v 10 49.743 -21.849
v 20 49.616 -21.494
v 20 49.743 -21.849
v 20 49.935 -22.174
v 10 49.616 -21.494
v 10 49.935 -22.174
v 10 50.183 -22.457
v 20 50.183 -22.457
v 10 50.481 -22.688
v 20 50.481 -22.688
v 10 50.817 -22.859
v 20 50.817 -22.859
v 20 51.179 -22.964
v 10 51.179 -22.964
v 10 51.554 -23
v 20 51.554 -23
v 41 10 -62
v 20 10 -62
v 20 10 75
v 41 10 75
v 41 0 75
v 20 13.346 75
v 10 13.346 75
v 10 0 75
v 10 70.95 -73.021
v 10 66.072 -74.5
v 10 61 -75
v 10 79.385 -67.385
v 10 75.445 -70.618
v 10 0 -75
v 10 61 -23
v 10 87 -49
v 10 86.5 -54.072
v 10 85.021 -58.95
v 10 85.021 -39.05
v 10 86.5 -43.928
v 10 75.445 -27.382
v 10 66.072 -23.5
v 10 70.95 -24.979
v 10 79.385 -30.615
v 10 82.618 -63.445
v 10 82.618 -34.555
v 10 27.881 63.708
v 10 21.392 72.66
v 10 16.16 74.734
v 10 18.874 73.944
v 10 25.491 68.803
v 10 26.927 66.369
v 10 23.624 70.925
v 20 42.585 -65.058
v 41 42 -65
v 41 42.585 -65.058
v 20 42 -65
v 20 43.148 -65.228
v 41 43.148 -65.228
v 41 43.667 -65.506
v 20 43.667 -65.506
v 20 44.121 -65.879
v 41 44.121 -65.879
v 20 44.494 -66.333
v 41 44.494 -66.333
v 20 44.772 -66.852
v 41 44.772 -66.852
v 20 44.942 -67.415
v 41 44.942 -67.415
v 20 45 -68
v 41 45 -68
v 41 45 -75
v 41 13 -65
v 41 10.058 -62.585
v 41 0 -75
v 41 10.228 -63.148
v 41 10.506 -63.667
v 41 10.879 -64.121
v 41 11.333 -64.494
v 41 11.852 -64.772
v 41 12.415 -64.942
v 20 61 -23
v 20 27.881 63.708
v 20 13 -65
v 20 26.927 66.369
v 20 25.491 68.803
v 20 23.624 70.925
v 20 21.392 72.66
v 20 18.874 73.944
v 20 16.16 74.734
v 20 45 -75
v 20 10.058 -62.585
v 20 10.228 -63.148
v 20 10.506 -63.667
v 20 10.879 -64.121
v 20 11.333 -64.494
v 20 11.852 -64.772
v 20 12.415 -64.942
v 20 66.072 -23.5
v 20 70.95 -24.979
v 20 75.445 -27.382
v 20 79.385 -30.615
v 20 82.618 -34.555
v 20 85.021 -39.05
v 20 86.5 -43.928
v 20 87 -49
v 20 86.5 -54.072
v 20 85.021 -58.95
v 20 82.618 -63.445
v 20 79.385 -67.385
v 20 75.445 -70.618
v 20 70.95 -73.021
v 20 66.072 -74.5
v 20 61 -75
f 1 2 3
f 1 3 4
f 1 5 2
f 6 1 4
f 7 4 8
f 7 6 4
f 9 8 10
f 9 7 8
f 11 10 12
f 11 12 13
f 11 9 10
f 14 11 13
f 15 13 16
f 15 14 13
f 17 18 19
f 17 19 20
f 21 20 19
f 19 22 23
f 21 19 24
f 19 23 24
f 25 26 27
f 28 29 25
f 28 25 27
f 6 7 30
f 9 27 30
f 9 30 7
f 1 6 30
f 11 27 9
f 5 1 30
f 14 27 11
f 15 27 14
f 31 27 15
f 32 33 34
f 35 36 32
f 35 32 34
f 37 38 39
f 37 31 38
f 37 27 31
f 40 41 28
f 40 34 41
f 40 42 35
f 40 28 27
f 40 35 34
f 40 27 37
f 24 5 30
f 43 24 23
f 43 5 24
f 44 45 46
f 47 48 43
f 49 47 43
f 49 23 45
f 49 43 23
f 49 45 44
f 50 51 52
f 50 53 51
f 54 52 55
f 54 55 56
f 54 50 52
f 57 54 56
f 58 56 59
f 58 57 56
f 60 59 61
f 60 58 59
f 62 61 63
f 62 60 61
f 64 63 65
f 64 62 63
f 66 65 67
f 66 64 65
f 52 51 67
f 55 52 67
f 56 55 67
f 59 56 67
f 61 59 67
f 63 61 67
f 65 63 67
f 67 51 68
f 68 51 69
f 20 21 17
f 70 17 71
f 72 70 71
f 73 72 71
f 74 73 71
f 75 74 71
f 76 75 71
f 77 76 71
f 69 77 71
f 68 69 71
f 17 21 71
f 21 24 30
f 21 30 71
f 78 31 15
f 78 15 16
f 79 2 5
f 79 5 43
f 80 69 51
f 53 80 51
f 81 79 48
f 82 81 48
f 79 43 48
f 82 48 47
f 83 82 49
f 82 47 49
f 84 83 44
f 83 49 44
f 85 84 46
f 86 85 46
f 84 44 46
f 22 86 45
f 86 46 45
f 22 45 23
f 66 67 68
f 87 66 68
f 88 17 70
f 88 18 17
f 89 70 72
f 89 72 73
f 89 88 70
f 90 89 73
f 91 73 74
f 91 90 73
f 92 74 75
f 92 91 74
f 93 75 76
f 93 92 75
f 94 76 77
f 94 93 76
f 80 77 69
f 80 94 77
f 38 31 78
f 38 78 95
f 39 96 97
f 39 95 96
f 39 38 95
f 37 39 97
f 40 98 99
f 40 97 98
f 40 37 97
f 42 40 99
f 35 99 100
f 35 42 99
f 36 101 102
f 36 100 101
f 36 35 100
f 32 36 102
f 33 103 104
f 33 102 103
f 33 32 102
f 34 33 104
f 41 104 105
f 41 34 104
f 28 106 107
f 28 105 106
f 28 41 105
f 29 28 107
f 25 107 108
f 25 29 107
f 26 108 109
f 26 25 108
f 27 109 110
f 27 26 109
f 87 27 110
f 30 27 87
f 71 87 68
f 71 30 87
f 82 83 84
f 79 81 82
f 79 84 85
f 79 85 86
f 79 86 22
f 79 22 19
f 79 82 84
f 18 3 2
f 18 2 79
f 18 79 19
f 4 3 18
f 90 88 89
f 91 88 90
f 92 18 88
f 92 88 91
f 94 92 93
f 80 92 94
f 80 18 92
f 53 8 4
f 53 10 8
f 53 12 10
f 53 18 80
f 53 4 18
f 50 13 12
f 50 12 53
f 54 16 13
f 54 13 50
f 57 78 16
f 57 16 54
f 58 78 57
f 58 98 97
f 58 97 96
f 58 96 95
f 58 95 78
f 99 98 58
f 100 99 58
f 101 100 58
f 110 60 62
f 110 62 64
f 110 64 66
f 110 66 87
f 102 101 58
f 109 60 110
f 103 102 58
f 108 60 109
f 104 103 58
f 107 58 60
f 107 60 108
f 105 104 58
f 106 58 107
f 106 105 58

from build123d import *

# Parameters (mm, degrees)
SKETCH1_W                = 82
SKETCH1_H                = 150
BOSS_EXTRUDE1_DEPTH      = 10
SKETCH2_W                = 10
SKETCH2_H                = 45
BOSS_EXTRUDE2_DEPTH      = 82
BOSS_EXTRUDE3_DEPTH      = 42
BOSS_EXTRUDE3_DEPTH_BACK = 10
FILLET3_RADIUS           = 26
FILLET3_LENGTH           = 10
FILLET4_RADIUS           = 26
FILLET4_LENGTH           = 10
BOSS_EXTRUDE4_DEPTH      = 10
BOSS_EXTRUDE5_DEPTH      = 10
FILLET5_R                = 15
FILLET6_R                = 15
SKETCH6_R                = 8
SKETCH6_R_2              = 5.5
CUT_EXTRUDE1_DEPTH       = 131.057679512
FILLET7_R                = 3
FILLET8_R                = 3
FILLET9_R                = 3
FILLET10_R               = 3
FILLET11_R               = 2
SKETCH7_R                = 5.5
CUT_EXTRUDE2_DEPTH       = 116.043470045
SKETCH8_W                = 181.068808942
SKETCH8_H                = 99.289789265
CUT_EXTRUDE3_DEPTH       = 126.678160394
SKETCH9_W                = 17.116284166
SKETCH9_H                = 92.331504729
BOSS_EXTRUDE6_DEPTH      = 10
SKETCH10_W               = 23.658167423
SKETCH10_H               = 25.148445686
SKETCH10_W_2             = 13.971358715
SKETCH10_H_2             = 14.716497846
BOSS_EXTRUDE7_DEPTH      = 10


with BuildPart() as part:
    # Sketch1 → Boss-Extrude1 (new body)
    with BuildSketch(Plane(origin=(0, 0, 0), x_dir=(1, 0, 0), z_dir=(0, 1, 0))):
        Rectangle(SKETCH1_W, SKETCH1_H)
    extrude(amount=BOSS_EXTRUDE1_DEPTH)

    # Sketch2 → Boss-Extrude2 (add, through all)
    with BuildSketch(Plane(origin=(41, 0, 0), x_dir=(0, 0, -1), z_dir=(1, 0, 0))):
        with Locations((70, 22.5)):
            Rectangle(SKETCH2_W, SKETCH2_H)
    extrude(amount=-BOSS_EXTRUDE2_DEPTH)

    # Sketch3 → Boss-Extrude3 (add, two sides: drawn at the far end of the back side and taken through both)
    with BuildSketch(Plane.XY.offset(-65).offset(-BOSS_EXTRUDE3_DEPTH_BACK)):
        Polygon((10, 45), (10, 10), (20, 10), (20, 45), (20, 87), (10, 87), align=None)
        Polygon((-10, 45), (-10, 87), (-20, 87), (-20, 45), (-20, 10), (-10, 10), align=None)
    extrude(amount=BOSS_EXTRUDE3_DEPTH + BOSS_EXTRUDE3_DEPTH_BACK)

    # Fillet3: full round fillet: the end face becomes a half cylinder, R = half its width
    fillet3_face = Plane((15, 87, -49), x_dir=(-1, 0, 0), z_dir=(0, 1, 0))  # on the end face: x along it, z out of the body
    fillet3_slab = fillet3_face.offset(-FILLET3_RADIUS / 2) * Box(FILLET3_LENGTH, 2 * FILLET3_RADIUS, FILLET3_RADIUS, mode=Mode.PRIVATE)  # the body's end, R deep
    fillet3_round = Plane((15, 61, -49), x_dir=(0, 1, 0), z_dir=(-1, 0, 0)) * Cylinder(FILLET3_RADIUS, FILLET3_LENGTH, mode=Mode.PRIVATE)  # its axis R under the face
    add(fillet3_slab - fillet3_round, mode=Mode.SUBTRACT)

    # Fillet4: full round fillet: the end face becomes a half cylinder, R = half its width
    fillet4_face = Plane((-15, 87, -49), x_dir=(-1, 0, 0), z_dir=(0, 1, 0))  # on the end face: x along it, z out of the body
    fillet4_slab = fillet4_face.offset(-FILLET4_RADIUS / 2) * Box(FILLET4_LENGTH, 2 * FILLET4_RADIUS, FILLET4_RADIUS, mode=Mode.PRIVATE)  # the body's end, R deep
    fillet4_round = Plane((-15, 61, -49), x_dir=(0, 1, 0), z_dir=(-1, 0, 0)) * Cylinder(FILLET4_RADIUS, FILLET4_LENGTH, mode=Mode.PRIVATE)  # its axis R under the face
    add(fillet4_slab - fillet4_round, mode=Mode.SUBTRACT)

    # Sketch4 → Boss-Extrude4 (add)
    with BuildSketch(Plane(origin=(20, 0, 0), x_dir=(0, 0, -1), z_dir=(1, 0, 0))):
        Polygon((23, 10), (23, 50), (-75, 25), (-75, 10), align=None)
    extrude(amount=-BOSS_EXTRUDE4_DEPTH)

    # Sketch5 → Boss-Extrude5 (add)
    with BuildSketch(Plane.ZY.offset(20)):
        Polygon((-23, 50), (75, 25), (75, 10), (-23, 10), align=None)
    extrude(amount=-BOSS_EXTRUDE5_DEPTH)

    # Fillet5
    fillet5_edges = [part.edges().sort_by_distance(p)[0] for p in [
        (15, 25, 75),
    ]]
    fillet(fillet5_edges, radius=FILLET5_R)

    # Fillet6
    fillet6_edges = [part.edges().sort_by_distance(p)[0] for p in [
        (-15, 25, 75),
    ]]
    fillet(fillet6_edges, radius=FILLET6_R)

    # Sketch6 → Cut-Extrude1 (cut, through all)
    with BuildSketch(Plane(origin=(20, 0, 0), x_dir=(0, 0, -1), z_dir=(1, 0, 0))):
        with Locations((49, 61)):
            Circle(SKETCH6_R)
        with Locations((-60, 17.5)):
            Circle(SKETCH6_R_2)
    extrude(amount=-CUT_EXTRUDE1_DEPTH, mode=Mode.SUBTRACT)

    # Fillet7
    fillet7_edges = [part.edges().sort_by_distance(p)[0] for p in [
        (30.5, 45, -65),
    ]]
    fillet(fillet7_edges, radius=FILLET7_R)

    # Fillet8
    fillet8_edges = [part.edges().sort_by_distance(p)[0] for p in [
        (0, 45, -65),
    ]]
    fillet(fillet8_edges, radius=FILLET8_R)

    # Fillet9
    fillet9_edges = [part.edges().sort_by_distance(p)[0] for p in [
        (-30.5, 45, -65),
    ]]
    fillet(fillet9_edges, radius=FILLET9_R)

    # Fillet10
    fillet10_edges = [part.edges().sort_by_distance(p)[0] for p in [
        (30.5, 10, -65),
        (0, 10, -65),
        (-30.5, 10, -65),
    ]]
    fillet(fillet10_edges, radius=FILLET10_R)

    # Fillet11
    fillet11_edges = [part.edges().sort_by_distance(p)[0] for p in [
        (15, 50, -23),
        (-15, 50, -23),
    ]]
    fillet(fillet11_edges, radius=FILLET11_R)

    # Sketch7 → Cut-Extrude2 (cut, through all)
    with BuildSketch(Plane(origin=(0, 10, 0), x_dir=(1, 0, 0), z_dir=(0, 1, 0))):
        with Locations(Location((31.5, 45, 0), (0, 0, 270))):
            Circle(SKETCH7_R)
        with Locations(Location((31.5, -15, 0), (0, 0, 270))):
            Circle(SKETCH7_R)
        with Locations(Location((-31.5, -15, 0), (0, 0, 90))):
            Circle(SKETCH7_R)
        with Locations(Location((-31.5, 45, 0), (0, 0, 90))):
            Circle(SKETCH7_R)
    extrude(amount=-CUT_EXTRUDE2_DEPTH, mode=Mode.SUBTRACT)

    # Sketch8 → Cut-Extrude3 (cut, through all)
    with BuildSketch(Plane.ZY.offset(-10)):
        with Locations((1.490278263, 42.723870649)):
            Rectangle(SKETCH8_W, SKETCH8_H)
    extrude(amount=CUT_EXTRUDE3_DEPTH, mode=Mode.SUBTRACT)

    # Sketch9 → Boss-Extrude6 (add, through all)
    with BuildSketch(Plane(origin=(0, 10, 0), x_dir=(1, 0, 0), z_dir=(0, 1, 0))):
        with Locations((30.200951285, 11.209960756)):
            Rectangle(SKETCH9_W, SKETCH9_H)
    extrude(amount=-BOSS_EXTRUDE6_DEPTH)

    # Sketch10 → Boss-Extrude7 (add)
    with BuildSketch(Plane.ZY.offset(-10)):
        with Locations((-48.340901153, 61.662766329)):
            Rectangle(SKETCH10_W, SKETCH10_H)
        with Locations((59.331703342, 16.768133659)):
            Rectangle(SKETCH10_W_2, SKETCH10_H_2)
    extrude(amount=-BOSS_EXTRUDE7_DEPTH)


solid = part.part
